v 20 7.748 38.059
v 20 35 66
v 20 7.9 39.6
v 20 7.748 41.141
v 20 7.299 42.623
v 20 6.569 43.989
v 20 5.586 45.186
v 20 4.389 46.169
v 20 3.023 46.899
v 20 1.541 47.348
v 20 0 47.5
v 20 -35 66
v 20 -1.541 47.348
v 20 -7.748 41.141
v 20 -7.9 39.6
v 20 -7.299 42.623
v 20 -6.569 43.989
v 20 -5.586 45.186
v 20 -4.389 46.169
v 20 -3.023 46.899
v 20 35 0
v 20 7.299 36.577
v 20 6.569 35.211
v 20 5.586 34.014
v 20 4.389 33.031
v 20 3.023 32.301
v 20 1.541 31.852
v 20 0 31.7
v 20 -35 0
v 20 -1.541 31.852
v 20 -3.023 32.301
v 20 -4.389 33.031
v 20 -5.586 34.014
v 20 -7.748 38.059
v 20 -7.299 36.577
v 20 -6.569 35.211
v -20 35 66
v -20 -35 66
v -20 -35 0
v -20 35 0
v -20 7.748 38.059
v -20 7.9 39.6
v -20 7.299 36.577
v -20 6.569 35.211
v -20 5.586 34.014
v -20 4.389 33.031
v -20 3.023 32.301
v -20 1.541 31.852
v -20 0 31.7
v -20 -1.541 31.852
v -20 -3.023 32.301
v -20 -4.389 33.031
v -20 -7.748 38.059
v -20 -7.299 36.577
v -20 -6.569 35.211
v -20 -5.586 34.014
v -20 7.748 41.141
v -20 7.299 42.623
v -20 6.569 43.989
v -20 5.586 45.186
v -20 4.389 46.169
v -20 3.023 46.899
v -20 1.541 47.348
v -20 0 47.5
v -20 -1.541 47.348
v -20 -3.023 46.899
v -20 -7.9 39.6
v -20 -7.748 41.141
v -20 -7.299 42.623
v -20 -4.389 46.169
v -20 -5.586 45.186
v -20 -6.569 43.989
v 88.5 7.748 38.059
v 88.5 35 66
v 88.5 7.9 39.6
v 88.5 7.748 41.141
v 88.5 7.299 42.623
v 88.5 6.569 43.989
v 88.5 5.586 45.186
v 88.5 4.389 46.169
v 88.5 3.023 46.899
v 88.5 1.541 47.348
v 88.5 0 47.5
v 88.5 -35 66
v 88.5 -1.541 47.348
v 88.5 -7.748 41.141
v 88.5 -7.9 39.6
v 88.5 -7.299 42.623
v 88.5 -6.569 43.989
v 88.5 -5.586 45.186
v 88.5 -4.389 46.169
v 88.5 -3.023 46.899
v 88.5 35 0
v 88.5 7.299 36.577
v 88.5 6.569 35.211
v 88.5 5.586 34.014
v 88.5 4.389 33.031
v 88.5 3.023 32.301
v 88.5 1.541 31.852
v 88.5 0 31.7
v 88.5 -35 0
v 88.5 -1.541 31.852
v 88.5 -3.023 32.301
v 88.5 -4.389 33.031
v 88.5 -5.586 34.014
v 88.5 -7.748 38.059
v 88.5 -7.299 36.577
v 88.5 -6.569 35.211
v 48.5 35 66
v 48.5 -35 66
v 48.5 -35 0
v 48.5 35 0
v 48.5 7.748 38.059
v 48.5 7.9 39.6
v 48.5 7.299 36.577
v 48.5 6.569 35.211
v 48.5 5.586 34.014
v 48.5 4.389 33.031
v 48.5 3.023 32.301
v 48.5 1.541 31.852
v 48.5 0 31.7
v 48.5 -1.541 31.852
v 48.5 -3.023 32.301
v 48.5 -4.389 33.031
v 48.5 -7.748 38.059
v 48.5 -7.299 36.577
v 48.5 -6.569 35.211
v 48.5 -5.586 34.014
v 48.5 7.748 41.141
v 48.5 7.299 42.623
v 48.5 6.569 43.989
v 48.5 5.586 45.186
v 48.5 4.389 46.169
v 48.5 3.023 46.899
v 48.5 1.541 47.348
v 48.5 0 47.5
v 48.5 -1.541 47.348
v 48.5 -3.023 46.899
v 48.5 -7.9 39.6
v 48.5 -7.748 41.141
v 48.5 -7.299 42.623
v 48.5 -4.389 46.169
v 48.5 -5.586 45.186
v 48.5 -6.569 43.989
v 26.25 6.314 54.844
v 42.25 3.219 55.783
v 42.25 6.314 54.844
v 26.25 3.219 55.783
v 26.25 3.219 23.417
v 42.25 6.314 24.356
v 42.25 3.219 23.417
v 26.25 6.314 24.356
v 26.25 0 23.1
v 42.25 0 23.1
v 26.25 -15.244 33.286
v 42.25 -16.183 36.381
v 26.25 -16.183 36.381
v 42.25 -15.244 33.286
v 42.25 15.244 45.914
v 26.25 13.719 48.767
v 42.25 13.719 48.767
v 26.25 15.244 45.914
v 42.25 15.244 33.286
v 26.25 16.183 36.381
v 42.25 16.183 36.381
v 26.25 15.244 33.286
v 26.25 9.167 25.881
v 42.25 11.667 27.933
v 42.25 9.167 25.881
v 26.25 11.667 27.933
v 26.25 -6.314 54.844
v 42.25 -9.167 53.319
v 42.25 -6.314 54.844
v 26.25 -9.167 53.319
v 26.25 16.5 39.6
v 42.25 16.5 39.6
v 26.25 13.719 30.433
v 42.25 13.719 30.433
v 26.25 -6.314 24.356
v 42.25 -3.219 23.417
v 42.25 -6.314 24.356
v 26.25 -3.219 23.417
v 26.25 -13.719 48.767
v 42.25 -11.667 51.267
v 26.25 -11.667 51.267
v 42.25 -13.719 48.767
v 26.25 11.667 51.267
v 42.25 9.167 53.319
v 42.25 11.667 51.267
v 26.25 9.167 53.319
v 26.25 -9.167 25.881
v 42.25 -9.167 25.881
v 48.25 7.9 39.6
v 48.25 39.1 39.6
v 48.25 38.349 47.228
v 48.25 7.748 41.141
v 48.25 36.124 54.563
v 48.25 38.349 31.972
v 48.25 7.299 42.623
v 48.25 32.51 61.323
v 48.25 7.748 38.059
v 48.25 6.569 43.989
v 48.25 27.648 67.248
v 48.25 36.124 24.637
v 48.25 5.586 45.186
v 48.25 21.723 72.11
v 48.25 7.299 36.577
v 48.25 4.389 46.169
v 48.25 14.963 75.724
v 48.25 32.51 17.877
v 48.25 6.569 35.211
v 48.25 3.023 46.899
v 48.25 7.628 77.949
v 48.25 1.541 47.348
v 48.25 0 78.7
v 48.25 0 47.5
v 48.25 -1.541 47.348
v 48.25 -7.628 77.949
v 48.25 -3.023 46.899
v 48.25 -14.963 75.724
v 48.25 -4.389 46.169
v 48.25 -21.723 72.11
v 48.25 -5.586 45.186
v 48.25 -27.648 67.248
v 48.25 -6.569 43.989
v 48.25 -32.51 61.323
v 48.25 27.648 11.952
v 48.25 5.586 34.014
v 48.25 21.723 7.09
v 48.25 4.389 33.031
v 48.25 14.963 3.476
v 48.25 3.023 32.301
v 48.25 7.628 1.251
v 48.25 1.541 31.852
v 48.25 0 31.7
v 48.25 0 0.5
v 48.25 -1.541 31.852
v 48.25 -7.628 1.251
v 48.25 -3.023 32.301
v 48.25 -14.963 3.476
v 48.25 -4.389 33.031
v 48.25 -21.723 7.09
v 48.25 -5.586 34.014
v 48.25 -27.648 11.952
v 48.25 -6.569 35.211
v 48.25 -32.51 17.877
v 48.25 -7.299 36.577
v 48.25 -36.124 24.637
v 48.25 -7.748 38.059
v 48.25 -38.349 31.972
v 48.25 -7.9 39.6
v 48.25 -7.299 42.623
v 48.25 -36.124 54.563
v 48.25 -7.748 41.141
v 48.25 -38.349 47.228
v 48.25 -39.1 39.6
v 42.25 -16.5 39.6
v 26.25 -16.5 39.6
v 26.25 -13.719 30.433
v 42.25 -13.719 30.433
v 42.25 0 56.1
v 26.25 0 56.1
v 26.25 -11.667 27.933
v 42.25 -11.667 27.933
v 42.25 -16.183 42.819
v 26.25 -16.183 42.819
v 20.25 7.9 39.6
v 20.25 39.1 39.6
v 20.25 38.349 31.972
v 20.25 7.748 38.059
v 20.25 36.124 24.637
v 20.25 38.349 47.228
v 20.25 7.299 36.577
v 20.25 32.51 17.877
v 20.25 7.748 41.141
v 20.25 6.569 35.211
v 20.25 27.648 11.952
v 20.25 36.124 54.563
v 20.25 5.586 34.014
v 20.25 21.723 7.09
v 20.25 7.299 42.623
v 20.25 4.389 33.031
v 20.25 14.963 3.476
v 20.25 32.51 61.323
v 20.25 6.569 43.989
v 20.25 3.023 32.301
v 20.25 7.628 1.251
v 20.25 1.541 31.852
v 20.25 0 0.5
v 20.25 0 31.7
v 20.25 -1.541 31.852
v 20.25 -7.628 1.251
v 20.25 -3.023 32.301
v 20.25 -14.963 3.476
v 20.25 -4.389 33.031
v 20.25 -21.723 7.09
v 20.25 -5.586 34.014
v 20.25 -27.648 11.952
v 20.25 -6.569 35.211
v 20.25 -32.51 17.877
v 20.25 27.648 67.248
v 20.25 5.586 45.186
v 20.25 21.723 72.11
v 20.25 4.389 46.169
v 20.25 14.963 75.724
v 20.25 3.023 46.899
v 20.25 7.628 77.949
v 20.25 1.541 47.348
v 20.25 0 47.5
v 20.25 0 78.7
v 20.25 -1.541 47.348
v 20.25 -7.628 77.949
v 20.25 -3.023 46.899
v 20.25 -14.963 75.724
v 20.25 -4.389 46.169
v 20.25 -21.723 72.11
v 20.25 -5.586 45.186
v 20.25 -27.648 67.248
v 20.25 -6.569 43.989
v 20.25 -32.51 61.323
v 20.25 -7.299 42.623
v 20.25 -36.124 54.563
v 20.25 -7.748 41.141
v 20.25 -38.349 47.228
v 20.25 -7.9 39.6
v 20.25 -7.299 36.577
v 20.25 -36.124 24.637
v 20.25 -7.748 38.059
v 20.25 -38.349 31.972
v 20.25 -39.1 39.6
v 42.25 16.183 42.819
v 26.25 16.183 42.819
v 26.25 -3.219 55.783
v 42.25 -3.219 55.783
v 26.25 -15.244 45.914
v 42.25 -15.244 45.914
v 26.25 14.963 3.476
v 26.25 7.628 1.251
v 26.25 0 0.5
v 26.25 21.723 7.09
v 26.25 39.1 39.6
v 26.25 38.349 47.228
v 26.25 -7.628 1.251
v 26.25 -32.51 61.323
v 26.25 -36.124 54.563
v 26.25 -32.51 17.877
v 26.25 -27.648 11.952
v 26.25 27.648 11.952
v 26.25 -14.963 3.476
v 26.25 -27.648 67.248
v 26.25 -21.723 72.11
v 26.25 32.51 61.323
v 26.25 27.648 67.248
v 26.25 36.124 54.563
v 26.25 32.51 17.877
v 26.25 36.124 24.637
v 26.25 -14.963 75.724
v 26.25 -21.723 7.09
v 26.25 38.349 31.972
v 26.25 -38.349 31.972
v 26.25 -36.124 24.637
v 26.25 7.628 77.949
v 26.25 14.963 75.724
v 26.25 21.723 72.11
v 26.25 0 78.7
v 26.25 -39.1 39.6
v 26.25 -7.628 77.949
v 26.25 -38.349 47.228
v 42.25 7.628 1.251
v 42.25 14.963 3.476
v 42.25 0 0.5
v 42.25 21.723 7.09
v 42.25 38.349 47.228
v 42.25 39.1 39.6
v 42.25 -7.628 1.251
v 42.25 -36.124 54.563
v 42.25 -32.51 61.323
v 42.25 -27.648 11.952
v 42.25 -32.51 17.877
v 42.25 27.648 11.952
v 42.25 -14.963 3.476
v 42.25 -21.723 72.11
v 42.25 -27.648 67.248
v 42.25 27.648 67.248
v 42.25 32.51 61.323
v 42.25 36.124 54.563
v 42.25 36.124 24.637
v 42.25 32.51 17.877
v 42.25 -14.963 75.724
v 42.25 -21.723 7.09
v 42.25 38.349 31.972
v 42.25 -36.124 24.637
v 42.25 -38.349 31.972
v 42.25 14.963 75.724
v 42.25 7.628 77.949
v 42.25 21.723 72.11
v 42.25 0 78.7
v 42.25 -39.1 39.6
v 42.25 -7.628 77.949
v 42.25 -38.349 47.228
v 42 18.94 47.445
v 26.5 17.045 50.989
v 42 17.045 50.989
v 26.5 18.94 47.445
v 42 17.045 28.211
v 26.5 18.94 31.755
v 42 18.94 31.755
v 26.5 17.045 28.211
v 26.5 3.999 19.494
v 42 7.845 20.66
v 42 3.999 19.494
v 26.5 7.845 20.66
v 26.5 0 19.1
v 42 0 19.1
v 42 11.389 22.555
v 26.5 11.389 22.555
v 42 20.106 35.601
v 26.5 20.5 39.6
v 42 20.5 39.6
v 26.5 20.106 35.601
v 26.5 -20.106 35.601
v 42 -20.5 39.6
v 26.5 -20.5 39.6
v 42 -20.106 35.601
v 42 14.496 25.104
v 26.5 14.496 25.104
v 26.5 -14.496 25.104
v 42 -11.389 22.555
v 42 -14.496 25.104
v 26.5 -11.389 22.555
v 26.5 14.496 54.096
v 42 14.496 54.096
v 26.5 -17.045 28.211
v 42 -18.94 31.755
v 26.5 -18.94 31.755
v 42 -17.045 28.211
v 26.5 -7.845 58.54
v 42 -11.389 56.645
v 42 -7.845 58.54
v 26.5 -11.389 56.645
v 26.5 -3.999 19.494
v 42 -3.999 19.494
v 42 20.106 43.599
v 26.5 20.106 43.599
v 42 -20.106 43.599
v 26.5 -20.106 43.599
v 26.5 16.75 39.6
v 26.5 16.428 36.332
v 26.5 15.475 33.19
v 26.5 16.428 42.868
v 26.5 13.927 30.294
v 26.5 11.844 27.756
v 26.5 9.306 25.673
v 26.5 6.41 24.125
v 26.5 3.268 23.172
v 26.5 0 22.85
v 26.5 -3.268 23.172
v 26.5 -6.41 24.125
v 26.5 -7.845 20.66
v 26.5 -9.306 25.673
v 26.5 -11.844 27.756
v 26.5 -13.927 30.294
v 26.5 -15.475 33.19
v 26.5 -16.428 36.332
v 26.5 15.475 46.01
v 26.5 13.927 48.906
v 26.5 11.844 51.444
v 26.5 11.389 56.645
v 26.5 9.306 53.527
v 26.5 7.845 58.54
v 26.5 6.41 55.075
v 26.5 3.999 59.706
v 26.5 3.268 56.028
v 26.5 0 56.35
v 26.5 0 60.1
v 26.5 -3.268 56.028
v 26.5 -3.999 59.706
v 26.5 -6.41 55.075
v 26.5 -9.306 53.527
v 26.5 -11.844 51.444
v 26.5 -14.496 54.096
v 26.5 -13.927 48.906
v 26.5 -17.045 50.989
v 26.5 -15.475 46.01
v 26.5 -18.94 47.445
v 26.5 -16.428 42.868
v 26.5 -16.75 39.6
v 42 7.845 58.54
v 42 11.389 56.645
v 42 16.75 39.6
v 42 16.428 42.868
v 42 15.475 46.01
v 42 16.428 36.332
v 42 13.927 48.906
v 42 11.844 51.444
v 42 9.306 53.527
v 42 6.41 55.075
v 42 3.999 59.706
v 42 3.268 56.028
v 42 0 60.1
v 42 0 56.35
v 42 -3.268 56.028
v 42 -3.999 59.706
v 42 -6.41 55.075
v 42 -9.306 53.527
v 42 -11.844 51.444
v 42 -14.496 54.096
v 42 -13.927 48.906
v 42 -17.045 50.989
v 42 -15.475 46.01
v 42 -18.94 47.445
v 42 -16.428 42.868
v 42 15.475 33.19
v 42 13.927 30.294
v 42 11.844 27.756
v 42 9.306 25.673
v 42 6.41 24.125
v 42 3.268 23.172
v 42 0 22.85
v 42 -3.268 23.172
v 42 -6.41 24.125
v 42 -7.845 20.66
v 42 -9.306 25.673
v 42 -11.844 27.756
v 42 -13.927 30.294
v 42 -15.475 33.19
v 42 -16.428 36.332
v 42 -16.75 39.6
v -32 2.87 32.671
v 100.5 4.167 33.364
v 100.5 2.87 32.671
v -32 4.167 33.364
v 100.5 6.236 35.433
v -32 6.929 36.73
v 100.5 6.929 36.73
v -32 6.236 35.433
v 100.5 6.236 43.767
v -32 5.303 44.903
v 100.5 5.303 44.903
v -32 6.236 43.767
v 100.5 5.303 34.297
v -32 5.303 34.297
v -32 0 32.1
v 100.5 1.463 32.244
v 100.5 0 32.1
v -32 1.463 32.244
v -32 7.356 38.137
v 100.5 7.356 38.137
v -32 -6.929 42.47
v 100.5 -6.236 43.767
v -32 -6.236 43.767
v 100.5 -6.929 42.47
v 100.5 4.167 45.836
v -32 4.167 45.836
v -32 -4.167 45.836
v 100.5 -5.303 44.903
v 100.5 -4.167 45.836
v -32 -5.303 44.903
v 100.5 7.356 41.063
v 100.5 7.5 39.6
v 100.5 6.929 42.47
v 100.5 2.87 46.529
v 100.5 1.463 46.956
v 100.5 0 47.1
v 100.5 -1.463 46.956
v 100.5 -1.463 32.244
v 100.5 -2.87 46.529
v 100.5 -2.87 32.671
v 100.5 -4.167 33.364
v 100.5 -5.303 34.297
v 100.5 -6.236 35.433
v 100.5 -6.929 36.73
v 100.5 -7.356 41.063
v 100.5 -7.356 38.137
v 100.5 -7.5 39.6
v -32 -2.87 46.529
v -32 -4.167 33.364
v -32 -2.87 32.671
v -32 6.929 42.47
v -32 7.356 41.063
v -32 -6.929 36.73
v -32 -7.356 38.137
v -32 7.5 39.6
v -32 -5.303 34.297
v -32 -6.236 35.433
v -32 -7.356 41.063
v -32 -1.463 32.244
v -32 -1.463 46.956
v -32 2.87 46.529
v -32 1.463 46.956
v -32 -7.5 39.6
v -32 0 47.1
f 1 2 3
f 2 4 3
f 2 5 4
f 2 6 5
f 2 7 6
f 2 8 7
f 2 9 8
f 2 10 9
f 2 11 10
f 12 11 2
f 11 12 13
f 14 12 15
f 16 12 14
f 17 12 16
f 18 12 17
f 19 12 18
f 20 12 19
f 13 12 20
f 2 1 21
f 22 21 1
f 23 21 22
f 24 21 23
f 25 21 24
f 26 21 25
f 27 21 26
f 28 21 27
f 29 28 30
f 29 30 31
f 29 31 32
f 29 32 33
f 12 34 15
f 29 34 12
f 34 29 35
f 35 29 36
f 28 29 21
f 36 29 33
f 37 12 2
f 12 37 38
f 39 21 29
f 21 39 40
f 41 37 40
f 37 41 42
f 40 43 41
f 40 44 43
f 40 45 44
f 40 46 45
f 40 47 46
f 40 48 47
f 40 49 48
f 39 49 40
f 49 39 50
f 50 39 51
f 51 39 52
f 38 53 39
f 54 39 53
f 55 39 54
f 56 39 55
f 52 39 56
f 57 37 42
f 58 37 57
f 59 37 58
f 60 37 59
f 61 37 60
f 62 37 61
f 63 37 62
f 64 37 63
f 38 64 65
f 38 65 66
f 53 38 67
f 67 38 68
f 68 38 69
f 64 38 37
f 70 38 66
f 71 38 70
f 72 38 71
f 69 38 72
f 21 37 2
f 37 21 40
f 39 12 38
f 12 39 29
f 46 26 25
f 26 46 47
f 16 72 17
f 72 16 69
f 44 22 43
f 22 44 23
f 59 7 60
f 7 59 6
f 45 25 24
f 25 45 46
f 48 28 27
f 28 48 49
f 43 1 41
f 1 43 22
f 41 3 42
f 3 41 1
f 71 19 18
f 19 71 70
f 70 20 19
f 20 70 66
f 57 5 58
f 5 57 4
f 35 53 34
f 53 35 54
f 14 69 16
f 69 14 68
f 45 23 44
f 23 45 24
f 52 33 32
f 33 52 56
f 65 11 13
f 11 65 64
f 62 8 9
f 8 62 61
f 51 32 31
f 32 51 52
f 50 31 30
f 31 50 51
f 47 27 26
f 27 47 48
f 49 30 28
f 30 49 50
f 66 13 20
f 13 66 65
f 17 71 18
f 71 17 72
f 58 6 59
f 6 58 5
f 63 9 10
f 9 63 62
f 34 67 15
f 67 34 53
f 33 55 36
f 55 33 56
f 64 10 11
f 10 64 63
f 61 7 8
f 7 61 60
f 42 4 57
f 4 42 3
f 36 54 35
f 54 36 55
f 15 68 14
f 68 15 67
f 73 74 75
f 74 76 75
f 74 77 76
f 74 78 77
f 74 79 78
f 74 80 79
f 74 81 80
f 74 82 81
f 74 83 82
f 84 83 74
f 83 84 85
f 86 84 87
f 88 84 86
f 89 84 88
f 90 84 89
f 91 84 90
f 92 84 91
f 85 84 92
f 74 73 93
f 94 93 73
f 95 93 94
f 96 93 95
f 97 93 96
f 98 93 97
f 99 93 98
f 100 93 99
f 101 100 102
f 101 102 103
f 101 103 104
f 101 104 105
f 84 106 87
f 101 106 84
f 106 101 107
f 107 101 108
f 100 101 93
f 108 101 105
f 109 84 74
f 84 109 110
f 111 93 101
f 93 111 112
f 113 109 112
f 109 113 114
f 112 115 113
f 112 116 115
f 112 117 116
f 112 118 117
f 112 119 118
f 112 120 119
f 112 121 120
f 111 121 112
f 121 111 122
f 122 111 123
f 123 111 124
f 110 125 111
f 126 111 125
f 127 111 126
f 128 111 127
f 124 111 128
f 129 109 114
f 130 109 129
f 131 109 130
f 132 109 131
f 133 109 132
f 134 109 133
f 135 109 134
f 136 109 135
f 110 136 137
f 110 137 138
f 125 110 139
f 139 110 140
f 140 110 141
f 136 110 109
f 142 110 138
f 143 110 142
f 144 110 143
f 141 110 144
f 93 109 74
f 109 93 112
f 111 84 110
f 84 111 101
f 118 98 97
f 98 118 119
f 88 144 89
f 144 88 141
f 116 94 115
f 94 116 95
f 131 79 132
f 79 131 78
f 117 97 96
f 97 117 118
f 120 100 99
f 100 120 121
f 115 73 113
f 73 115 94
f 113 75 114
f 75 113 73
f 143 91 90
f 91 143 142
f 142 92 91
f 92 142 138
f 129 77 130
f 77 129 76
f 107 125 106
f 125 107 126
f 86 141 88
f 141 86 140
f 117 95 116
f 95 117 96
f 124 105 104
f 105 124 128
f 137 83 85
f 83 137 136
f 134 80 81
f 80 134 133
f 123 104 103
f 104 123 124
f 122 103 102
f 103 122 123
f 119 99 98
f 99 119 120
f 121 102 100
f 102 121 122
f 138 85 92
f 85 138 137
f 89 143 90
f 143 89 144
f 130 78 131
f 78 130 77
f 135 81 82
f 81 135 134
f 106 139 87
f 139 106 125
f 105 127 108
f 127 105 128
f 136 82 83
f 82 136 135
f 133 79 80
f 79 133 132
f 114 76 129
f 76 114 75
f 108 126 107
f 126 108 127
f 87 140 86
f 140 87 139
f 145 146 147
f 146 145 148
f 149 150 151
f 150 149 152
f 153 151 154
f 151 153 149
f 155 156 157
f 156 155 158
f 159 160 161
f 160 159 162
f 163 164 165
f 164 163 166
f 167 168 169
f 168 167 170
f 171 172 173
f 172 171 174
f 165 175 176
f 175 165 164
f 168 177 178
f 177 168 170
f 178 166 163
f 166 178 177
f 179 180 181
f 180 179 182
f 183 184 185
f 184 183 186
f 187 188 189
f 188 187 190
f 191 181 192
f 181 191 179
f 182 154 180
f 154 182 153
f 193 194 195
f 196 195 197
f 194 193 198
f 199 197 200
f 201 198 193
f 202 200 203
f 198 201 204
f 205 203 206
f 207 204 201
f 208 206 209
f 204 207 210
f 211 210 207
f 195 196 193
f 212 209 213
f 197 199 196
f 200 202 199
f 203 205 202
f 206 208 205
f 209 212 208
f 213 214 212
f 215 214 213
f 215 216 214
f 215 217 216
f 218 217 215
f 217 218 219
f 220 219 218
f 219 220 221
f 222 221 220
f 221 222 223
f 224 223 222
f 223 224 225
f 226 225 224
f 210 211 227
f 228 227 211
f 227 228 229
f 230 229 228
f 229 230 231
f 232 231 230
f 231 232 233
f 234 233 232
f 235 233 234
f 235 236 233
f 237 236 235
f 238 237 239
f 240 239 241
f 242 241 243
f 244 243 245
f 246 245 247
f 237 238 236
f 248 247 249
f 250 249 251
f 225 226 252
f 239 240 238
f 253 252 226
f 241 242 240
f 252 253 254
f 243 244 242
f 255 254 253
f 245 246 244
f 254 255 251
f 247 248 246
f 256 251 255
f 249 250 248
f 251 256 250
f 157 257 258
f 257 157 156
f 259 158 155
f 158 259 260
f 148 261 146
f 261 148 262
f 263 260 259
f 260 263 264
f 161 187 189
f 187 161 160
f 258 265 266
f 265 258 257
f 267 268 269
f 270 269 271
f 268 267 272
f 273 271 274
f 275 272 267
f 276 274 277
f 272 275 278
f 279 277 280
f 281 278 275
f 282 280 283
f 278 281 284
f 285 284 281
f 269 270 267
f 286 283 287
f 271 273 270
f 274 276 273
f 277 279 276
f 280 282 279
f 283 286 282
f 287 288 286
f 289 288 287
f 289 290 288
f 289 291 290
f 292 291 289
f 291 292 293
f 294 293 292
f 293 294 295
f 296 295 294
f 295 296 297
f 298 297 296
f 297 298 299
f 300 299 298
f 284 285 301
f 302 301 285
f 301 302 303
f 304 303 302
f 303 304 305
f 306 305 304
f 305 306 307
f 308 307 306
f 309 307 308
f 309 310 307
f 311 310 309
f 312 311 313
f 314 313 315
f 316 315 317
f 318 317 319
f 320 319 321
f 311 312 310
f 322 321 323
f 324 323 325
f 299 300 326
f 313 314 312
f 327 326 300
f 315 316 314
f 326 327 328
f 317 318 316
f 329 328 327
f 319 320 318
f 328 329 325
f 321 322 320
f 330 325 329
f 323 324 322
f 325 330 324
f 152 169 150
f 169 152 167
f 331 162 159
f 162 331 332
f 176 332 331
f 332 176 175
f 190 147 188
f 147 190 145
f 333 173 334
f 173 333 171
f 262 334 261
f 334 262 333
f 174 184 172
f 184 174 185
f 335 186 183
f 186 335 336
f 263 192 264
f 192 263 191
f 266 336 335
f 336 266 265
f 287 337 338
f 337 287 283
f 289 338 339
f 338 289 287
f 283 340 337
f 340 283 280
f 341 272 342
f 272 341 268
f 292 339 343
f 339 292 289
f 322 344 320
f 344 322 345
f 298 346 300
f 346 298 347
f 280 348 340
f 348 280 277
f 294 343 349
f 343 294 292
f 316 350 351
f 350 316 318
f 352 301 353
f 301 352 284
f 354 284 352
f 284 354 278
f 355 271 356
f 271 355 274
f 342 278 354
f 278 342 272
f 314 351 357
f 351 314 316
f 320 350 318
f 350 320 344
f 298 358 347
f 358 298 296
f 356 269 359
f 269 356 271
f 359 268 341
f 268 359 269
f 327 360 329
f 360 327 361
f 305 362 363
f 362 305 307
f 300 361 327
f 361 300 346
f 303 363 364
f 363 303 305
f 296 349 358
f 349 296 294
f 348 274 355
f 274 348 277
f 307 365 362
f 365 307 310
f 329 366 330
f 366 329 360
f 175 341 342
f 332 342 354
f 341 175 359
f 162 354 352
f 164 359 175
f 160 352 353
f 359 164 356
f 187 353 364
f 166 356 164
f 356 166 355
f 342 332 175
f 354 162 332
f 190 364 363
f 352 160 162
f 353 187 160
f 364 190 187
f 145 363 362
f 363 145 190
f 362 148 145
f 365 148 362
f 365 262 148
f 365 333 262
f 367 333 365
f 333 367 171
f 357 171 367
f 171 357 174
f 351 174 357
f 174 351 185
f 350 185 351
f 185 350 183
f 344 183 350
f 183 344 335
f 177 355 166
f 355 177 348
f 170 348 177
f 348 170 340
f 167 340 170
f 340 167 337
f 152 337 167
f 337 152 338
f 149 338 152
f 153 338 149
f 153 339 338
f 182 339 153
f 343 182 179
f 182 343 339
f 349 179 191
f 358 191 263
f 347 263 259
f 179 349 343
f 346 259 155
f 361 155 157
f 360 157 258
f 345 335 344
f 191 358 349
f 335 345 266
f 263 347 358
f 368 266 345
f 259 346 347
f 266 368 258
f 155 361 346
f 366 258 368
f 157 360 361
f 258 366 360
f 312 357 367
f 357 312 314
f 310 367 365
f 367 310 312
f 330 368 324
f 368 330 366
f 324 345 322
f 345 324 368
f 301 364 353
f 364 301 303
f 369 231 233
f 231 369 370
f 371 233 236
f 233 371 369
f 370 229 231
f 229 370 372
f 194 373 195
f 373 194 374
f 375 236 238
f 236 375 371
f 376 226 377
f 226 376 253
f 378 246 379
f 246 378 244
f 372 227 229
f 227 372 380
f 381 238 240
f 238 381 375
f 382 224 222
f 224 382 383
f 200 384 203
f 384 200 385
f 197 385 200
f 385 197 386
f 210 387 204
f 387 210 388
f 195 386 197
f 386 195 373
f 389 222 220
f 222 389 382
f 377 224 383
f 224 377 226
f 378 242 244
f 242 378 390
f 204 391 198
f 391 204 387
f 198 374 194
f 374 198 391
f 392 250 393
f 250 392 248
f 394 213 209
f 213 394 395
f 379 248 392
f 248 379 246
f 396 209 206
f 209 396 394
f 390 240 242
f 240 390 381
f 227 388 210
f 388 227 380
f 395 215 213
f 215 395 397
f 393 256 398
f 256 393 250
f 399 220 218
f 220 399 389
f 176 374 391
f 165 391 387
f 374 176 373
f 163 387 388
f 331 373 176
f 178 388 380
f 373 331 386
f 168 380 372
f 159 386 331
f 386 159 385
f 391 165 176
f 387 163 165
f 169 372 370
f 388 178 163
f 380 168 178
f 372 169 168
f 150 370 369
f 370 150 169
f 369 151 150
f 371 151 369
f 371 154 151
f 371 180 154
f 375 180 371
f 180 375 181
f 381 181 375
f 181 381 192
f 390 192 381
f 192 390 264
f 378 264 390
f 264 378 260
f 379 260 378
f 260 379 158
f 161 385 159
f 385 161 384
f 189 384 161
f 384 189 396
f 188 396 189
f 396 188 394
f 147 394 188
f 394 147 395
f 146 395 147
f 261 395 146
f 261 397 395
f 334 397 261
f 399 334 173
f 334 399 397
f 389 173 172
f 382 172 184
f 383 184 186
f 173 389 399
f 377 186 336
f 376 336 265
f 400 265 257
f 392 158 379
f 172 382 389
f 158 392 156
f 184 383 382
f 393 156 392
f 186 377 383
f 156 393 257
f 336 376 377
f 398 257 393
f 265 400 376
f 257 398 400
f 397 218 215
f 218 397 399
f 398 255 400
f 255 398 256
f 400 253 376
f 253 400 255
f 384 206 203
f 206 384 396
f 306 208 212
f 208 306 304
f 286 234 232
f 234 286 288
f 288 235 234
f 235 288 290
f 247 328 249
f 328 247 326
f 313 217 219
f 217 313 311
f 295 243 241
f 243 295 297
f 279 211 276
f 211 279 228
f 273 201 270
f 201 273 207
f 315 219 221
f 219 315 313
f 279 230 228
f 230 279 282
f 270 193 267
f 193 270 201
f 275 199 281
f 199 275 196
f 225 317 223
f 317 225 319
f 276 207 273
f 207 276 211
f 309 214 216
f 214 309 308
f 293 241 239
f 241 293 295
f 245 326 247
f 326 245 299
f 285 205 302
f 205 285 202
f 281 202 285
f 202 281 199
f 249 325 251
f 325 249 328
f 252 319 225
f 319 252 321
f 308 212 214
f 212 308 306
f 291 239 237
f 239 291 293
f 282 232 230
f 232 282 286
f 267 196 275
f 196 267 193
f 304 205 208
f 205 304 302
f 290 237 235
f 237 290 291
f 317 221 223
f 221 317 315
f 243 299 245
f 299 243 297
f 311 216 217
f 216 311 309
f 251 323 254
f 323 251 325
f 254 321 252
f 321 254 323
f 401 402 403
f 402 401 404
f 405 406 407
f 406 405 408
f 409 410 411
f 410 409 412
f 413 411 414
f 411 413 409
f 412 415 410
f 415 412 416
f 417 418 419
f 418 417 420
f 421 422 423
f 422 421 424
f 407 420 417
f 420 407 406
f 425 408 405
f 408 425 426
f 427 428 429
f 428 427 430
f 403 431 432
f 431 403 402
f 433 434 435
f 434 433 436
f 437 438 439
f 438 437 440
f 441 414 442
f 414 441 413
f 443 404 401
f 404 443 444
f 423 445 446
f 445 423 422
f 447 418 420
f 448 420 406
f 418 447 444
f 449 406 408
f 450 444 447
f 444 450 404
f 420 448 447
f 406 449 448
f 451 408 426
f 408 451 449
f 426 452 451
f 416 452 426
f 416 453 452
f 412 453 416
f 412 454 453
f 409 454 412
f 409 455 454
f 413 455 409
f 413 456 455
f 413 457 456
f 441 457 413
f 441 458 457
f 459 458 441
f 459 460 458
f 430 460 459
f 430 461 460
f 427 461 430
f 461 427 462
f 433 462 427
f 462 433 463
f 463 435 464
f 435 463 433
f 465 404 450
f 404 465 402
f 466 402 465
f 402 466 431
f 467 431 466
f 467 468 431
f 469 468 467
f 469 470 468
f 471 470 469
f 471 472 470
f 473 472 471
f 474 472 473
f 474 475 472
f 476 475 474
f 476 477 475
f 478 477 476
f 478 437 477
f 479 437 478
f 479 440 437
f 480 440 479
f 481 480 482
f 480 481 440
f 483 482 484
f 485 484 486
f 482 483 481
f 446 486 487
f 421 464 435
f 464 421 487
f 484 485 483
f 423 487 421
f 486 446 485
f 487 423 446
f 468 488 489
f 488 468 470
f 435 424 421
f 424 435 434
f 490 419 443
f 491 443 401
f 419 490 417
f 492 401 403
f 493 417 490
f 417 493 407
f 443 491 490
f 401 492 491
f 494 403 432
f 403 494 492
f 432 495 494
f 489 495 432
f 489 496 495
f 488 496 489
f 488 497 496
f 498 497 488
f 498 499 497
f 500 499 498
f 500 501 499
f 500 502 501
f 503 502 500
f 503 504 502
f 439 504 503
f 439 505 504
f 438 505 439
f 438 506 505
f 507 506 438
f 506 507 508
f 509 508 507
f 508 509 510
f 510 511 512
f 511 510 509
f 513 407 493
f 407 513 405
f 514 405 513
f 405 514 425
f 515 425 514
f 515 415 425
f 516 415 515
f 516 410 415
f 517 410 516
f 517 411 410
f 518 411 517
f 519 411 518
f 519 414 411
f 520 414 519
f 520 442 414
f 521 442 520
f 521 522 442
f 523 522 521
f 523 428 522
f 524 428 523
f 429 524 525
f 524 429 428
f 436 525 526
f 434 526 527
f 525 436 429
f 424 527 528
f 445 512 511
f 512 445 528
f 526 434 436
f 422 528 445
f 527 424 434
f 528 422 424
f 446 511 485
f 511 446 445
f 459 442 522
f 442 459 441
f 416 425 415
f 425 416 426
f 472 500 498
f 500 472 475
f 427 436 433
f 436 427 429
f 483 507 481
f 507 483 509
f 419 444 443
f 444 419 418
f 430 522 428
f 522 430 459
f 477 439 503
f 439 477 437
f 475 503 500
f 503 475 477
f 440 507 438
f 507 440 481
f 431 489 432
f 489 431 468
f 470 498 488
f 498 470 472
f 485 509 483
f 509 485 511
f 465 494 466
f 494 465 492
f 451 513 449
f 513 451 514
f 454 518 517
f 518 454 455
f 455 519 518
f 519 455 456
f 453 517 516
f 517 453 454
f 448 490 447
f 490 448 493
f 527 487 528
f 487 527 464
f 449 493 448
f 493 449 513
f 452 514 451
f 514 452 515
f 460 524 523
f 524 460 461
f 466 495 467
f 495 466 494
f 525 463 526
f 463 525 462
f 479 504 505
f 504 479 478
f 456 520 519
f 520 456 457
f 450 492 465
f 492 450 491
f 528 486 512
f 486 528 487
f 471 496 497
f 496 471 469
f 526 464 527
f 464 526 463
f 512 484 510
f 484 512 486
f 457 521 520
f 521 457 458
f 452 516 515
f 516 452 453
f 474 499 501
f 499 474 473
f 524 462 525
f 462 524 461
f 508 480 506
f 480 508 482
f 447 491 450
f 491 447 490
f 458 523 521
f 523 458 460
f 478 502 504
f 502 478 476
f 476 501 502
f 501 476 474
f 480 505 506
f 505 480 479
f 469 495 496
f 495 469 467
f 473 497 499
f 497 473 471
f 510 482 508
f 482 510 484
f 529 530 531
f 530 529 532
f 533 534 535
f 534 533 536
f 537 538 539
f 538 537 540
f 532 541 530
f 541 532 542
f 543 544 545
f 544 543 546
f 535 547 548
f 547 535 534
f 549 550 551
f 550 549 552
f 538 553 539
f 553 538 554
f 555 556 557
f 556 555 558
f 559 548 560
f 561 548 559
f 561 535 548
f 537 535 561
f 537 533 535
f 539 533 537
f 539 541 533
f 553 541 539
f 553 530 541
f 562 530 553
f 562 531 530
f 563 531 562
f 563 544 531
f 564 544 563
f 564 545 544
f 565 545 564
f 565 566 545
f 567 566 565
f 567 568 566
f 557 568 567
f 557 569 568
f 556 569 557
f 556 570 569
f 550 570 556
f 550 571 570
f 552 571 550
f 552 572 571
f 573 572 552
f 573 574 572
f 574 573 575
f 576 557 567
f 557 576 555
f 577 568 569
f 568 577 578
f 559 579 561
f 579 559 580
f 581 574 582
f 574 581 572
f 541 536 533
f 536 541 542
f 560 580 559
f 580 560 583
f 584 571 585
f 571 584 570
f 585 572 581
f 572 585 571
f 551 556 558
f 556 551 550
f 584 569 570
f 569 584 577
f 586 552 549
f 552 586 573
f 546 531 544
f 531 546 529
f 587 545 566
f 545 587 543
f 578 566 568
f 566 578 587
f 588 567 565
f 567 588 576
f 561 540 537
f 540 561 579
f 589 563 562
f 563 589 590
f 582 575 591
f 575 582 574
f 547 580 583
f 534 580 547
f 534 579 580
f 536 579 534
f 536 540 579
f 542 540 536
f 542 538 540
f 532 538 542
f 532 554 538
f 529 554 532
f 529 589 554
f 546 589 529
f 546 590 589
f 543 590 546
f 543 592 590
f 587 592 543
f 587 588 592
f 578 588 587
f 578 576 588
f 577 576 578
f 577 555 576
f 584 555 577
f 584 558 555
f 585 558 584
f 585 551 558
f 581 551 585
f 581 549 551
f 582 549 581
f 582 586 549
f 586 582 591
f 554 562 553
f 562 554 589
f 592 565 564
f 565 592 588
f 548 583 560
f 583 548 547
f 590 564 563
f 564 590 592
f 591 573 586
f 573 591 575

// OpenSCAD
$fn = 32;

// ------------------------------------------------------------------------
// Pulley assembly: d78.2 pulley with a belt, shaft d15
// Every part is its own module, assembly() places them once.
// ------------------------------------------------------------------------

// --- part 1 ---
module support1() {
  difference() {
    translate([-20, -35, 0]) cube([40, 70, 66]);
    translate([0, 0, 39.6]) rotate([0, 90, 0]) cylinder(h = 42, d = 15.8, center = true);
  }
}

// --- part 2 ---
module support2() {
  difference() {
    translate([-20, -35, 0]) cube([40, 70, 66]);
    translate([0, 0, 39.6]) rotate([0, 90, 0]) cylinder(h = 42, d = 15.8, center = true);
  }
}

// --- part 3 ---
module shaft() {
  translate([0, 0, -66.25]) cylinder(h = 132.5, d = 15);
}

// --- part 4 ---
module pulley() {
  difference() {
    union() {
      cylinder(h = 28, d = 33);
      cylinder(h = 6, d = 78.2);
      translate([0, 0, 22]) cylinder(h = 6, d = 78.2);
    }
    translate([0, 0, -1]) cylinder(h = 30, d = 15.8);
  }
}

// --- part 5 ---
module belt() {
  difference() {
      translate([0, 0, 0]) cylinder(h = 15.5, d = 41);
      translate([0, 0, -1]) cylinder(h = 17.5, d = 33.5);
    }
}

// --- assembly ---
module assembly() {
  translate([0, 0, 0]) rotate([0, 0, 0]) support1();
  translate([68.5, 0, 0]) rotate([0, 0, 0]) support2();
  translate([34.25, 0, 39.6]) rotate([0, 90, 0]) shaft();
  translate([20.25, 0, 39.6]) rotate([0, 90, 0]) pulley();
  translate([26.5, 0, 39.6]) rotate([0, 90, 0]) belt();
}

assembly();
